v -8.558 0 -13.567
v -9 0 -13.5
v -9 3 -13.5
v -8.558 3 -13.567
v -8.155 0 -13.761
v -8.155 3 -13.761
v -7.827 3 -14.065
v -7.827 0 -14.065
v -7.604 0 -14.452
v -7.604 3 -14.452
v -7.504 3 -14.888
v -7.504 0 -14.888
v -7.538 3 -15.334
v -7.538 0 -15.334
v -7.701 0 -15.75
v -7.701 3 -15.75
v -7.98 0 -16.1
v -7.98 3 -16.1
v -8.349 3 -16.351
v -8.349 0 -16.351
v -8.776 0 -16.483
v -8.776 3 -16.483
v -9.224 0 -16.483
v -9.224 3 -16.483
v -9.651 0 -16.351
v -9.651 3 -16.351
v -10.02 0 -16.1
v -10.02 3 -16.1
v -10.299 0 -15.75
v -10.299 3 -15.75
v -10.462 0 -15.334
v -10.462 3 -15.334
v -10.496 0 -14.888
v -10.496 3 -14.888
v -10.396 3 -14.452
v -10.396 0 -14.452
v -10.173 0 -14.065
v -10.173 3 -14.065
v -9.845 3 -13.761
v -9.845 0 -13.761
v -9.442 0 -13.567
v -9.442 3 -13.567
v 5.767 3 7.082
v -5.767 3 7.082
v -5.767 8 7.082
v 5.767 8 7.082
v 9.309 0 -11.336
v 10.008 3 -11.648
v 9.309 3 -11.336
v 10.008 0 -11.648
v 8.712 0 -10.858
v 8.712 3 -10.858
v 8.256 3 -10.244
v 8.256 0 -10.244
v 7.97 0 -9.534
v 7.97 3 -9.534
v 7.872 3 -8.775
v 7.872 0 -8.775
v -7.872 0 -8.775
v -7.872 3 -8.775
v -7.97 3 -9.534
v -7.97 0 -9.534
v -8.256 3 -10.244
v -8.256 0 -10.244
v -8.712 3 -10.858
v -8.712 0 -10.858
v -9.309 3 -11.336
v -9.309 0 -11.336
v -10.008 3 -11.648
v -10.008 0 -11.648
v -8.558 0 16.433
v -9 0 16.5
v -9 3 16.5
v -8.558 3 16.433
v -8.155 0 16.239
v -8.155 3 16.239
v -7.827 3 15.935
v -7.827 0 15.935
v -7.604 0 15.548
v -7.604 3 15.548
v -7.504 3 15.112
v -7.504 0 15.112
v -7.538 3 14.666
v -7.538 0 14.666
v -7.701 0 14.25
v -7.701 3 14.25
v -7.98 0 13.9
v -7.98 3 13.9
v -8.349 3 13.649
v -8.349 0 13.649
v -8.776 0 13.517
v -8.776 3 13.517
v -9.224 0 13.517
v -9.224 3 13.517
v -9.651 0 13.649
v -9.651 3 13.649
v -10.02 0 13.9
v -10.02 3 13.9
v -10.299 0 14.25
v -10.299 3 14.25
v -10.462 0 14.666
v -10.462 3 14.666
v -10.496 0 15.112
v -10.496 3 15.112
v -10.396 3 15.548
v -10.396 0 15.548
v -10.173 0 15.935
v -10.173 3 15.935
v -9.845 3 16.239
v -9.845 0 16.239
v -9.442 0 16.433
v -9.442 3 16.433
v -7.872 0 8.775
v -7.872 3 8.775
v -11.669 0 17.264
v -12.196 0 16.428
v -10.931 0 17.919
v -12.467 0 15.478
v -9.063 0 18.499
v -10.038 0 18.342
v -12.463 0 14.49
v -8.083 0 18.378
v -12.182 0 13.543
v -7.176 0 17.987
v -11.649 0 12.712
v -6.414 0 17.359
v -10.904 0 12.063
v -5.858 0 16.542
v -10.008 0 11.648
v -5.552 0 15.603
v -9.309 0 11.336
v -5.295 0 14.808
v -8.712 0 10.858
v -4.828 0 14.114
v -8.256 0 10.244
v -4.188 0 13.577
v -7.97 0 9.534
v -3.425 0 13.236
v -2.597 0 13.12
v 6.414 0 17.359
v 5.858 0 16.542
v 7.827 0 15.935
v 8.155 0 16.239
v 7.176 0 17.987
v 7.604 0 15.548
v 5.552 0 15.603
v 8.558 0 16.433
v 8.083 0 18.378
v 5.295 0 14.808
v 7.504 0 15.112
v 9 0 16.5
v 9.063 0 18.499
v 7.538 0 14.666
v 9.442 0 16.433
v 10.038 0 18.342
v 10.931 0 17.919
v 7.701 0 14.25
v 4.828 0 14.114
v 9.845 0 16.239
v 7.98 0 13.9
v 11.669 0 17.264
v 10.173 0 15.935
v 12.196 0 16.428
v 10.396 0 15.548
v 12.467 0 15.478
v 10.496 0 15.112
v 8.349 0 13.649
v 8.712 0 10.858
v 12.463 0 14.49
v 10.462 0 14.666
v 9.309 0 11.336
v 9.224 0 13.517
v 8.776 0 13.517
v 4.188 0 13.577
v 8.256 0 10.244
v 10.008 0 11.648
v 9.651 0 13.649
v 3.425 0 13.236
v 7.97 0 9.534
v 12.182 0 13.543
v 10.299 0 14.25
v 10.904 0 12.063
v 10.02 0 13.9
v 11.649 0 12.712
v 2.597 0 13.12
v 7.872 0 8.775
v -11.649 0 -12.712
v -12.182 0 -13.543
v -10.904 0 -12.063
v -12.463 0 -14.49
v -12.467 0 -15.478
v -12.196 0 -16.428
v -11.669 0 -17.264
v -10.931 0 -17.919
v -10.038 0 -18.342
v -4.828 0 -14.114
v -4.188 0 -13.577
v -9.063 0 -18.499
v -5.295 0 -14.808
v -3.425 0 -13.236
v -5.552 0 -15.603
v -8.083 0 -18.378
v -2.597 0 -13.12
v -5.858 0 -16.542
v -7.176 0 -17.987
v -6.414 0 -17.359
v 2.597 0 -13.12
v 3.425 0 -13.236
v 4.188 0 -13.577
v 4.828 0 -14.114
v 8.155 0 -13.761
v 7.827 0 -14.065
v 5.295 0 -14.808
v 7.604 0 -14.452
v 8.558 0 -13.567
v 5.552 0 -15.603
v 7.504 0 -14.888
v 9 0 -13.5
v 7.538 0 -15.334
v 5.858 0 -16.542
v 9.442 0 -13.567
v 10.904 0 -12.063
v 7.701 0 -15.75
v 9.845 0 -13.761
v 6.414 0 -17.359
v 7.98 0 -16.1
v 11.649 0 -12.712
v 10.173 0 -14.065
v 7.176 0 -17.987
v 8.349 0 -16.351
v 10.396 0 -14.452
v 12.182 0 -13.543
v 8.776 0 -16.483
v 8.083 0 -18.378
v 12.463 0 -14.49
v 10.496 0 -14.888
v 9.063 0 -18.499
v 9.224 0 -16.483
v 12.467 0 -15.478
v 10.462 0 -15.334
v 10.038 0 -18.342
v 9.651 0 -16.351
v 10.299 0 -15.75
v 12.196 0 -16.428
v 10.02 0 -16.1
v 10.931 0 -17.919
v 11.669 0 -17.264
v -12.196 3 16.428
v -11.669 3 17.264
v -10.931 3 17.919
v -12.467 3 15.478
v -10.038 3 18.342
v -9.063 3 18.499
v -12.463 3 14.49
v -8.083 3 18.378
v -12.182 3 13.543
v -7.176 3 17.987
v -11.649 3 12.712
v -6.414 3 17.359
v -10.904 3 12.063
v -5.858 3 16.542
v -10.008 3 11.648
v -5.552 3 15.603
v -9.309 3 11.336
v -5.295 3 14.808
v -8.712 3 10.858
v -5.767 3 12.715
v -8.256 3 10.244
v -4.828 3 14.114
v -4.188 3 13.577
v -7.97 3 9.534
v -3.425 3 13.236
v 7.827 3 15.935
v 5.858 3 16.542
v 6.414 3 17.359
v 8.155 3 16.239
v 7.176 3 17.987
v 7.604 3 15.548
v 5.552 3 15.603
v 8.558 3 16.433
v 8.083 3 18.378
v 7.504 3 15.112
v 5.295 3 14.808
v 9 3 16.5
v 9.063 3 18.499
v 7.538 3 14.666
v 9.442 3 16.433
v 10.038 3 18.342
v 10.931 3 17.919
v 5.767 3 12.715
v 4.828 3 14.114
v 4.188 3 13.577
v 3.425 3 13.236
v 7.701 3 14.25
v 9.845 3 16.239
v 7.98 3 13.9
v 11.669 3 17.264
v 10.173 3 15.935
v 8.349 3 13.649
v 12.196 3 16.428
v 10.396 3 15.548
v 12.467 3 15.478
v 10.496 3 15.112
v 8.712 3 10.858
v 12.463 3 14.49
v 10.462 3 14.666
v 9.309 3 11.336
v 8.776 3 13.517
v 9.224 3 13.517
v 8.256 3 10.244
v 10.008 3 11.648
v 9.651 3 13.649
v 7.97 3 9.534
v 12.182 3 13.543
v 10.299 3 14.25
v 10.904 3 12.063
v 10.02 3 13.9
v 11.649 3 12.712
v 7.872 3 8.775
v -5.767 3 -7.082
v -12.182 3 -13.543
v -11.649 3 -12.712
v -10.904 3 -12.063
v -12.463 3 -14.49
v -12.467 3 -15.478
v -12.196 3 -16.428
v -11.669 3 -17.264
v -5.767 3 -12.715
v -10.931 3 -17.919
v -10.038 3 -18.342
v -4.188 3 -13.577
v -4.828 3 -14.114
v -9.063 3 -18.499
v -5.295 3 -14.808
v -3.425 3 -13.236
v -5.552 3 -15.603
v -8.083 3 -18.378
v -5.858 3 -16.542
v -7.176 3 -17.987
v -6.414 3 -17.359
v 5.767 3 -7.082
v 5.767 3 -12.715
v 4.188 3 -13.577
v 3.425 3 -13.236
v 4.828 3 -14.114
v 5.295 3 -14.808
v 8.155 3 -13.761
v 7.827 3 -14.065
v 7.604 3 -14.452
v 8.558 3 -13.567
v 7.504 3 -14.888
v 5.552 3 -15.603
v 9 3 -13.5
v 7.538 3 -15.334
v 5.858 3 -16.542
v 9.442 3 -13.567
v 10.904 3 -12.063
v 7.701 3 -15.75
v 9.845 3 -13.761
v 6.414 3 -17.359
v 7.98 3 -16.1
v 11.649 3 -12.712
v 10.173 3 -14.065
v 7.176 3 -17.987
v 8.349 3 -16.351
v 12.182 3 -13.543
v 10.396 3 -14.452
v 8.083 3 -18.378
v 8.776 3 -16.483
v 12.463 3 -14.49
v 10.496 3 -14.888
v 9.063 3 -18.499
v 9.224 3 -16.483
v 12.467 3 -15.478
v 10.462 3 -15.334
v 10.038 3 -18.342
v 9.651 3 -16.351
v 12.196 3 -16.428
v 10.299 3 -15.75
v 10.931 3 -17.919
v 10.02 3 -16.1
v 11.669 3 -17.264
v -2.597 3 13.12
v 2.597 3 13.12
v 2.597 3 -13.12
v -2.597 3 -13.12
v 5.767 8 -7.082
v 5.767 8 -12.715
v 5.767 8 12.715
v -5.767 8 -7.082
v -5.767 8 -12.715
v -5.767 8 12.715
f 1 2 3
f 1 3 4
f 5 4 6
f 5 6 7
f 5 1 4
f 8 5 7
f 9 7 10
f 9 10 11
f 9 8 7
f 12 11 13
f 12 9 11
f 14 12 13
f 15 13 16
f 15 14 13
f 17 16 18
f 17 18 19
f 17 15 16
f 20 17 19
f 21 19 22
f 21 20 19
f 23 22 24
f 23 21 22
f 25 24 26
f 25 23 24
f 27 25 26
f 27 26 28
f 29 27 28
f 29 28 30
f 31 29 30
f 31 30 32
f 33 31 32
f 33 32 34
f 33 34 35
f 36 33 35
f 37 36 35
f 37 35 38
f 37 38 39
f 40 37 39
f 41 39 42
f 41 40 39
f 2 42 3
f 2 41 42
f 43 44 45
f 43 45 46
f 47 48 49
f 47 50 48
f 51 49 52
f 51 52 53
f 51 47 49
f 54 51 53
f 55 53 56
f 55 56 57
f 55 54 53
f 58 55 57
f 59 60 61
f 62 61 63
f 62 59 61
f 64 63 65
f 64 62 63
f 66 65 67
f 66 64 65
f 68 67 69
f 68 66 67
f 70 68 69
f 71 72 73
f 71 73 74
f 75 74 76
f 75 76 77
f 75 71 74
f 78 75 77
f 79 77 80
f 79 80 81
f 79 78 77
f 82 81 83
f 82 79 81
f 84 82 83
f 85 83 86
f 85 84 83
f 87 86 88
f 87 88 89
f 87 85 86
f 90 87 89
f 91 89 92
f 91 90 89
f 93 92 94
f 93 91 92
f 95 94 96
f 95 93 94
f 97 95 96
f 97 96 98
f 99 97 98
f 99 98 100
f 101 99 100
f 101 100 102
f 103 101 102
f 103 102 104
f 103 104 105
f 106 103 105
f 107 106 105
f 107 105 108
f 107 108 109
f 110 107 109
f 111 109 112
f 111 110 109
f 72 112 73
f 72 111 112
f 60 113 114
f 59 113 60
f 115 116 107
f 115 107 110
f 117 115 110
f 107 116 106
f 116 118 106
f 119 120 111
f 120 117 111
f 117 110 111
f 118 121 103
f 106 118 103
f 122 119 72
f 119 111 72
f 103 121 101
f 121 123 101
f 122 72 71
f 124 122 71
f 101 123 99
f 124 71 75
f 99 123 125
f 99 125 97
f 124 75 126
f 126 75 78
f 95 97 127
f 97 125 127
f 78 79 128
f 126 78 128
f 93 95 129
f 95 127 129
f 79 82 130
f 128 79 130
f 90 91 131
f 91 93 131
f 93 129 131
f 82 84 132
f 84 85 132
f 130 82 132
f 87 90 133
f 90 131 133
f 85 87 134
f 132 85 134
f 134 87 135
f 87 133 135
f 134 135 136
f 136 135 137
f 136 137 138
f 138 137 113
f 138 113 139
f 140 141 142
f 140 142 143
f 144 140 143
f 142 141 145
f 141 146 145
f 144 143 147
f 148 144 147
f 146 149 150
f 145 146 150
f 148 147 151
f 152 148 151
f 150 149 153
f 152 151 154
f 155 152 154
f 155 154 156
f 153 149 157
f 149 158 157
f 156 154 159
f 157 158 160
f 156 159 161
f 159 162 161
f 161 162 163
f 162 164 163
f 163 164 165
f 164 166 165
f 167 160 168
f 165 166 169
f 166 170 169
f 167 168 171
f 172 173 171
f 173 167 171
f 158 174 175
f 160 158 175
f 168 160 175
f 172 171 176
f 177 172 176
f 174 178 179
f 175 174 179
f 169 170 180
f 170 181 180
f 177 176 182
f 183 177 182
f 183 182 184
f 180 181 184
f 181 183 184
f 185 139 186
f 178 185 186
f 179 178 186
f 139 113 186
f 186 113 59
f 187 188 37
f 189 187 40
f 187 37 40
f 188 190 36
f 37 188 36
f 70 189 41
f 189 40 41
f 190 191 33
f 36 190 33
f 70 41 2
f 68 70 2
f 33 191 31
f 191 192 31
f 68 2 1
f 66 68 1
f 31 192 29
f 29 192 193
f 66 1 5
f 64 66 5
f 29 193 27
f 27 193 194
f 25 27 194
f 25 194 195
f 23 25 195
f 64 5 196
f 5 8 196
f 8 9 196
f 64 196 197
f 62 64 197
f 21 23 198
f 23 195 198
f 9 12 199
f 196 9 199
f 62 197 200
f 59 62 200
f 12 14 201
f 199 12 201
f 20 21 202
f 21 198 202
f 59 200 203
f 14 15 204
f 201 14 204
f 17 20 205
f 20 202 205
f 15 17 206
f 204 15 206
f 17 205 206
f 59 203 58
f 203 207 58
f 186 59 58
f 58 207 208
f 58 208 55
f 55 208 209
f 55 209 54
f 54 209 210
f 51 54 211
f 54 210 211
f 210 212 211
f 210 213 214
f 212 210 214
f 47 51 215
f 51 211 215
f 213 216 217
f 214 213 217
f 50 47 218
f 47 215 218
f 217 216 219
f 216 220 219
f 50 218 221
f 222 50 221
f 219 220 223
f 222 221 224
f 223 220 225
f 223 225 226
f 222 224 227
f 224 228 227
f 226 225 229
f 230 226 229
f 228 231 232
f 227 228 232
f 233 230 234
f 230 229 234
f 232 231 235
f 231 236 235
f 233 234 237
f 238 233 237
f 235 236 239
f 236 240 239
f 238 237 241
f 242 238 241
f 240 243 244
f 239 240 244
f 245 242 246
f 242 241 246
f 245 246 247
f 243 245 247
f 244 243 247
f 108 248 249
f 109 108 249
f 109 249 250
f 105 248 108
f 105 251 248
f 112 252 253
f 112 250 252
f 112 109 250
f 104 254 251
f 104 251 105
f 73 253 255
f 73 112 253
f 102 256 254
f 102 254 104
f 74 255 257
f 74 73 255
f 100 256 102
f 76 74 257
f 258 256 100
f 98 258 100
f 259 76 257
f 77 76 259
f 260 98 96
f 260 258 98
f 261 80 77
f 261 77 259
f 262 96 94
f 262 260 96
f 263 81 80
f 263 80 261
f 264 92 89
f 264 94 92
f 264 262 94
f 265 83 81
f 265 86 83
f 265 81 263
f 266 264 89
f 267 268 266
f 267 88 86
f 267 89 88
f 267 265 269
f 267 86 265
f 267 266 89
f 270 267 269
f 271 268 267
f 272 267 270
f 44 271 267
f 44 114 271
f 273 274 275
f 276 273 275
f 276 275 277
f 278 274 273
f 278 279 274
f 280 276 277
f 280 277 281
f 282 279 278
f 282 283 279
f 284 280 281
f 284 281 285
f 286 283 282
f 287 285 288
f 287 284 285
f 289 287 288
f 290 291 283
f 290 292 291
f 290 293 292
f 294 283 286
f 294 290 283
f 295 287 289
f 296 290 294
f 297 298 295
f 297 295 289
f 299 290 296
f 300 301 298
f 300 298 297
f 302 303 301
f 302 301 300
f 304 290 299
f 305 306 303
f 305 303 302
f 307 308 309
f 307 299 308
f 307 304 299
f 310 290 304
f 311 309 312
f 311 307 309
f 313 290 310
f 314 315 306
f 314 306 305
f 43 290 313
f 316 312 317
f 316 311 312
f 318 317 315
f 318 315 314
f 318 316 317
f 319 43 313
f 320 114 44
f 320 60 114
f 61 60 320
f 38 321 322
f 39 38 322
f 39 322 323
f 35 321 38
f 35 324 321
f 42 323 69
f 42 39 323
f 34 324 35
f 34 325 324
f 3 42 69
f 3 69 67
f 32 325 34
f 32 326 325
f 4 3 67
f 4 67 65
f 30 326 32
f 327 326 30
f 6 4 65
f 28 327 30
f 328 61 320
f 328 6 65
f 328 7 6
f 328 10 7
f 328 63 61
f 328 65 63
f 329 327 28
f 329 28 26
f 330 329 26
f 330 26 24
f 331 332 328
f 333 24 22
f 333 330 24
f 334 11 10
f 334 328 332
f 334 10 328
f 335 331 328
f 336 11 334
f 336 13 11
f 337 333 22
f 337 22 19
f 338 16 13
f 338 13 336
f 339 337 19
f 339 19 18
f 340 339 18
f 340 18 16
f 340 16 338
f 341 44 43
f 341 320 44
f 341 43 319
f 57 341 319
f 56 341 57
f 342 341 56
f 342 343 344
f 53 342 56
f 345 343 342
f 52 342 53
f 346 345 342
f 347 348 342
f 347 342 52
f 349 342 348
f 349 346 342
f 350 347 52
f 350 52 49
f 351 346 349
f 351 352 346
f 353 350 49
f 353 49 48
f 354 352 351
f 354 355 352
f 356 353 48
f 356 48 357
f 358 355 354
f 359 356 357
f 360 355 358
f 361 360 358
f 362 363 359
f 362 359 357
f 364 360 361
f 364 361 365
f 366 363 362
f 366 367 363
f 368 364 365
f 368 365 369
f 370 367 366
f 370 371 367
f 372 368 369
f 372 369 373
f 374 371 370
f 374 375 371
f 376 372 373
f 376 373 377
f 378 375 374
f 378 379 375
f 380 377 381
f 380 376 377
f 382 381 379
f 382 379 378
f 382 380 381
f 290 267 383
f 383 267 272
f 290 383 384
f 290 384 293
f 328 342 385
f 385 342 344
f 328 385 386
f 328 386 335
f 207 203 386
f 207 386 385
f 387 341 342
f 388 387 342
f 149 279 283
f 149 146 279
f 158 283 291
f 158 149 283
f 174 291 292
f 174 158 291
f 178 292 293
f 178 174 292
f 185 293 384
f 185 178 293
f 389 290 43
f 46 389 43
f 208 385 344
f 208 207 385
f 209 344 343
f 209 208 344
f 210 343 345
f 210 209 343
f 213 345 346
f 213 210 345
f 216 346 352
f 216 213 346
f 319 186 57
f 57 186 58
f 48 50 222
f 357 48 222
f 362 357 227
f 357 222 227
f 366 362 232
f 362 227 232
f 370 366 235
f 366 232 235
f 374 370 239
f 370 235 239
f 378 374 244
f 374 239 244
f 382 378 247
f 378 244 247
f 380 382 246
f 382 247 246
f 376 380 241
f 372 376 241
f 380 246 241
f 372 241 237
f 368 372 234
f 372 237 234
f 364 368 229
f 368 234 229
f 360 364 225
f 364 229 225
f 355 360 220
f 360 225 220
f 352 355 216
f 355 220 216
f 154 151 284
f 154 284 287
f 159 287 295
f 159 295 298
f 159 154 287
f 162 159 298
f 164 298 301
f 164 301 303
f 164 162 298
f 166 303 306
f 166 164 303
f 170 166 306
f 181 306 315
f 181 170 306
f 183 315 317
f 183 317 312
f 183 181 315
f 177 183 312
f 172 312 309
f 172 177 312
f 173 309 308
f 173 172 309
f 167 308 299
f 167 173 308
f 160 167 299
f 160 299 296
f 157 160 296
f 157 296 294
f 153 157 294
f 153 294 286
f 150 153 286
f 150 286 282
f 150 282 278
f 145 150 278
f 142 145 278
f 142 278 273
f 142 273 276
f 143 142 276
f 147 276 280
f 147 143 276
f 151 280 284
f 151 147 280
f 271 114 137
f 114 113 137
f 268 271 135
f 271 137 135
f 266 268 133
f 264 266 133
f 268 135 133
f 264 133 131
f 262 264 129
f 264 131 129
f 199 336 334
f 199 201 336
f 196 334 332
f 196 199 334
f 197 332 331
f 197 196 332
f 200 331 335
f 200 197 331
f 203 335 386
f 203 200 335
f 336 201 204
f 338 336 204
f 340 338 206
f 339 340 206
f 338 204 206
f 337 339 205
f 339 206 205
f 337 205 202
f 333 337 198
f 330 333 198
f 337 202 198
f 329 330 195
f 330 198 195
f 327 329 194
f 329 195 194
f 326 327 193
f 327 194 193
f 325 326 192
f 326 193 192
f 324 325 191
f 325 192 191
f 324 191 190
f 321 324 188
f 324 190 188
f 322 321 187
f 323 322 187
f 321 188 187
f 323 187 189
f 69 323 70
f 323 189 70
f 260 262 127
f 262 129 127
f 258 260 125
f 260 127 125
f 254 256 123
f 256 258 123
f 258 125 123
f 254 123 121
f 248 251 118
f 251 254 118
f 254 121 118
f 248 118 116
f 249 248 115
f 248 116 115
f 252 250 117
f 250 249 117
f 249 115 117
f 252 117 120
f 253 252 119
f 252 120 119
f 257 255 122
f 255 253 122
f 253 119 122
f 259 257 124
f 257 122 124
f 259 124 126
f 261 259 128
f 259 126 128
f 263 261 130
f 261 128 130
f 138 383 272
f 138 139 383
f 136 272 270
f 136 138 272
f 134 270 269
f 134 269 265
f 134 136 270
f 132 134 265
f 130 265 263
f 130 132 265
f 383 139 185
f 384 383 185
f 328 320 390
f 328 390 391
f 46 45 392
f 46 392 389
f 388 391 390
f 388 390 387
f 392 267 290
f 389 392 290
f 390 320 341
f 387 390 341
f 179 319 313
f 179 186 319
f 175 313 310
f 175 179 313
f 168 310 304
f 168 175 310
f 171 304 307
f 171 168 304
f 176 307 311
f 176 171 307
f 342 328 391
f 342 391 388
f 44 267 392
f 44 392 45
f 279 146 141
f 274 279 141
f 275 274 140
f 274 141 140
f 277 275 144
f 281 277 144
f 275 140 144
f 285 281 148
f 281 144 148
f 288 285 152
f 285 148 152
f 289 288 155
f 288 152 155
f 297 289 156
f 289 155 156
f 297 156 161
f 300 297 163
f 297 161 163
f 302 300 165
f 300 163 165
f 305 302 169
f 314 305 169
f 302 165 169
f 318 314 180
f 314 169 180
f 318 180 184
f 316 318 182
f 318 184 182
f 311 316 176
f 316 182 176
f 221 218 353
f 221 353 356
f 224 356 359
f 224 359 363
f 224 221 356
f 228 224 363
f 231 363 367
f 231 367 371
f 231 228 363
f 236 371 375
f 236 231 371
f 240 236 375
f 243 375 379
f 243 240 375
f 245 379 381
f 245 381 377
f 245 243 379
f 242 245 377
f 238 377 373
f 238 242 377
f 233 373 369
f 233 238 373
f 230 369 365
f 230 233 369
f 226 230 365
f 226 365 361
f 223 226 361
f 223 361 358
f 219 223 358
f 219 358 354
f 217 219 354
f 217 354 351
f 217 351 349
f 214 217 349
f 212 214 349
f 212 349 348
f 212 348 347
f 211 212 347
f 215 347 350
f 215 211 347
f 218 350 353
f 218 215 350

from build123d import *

# Parameters (mm, degrees)
SKETCH1_R           = 3.5
SKETCH1_R_2         = 1.5
SKETCH1_W           = 15.74389133
SKETCH1_H           = 26.239818884
BOSS_EXTRUDE1_DEPTH = 3
FILLET1_R           = 3
SKETCH2_W           = 11.534893024
SKETCH2_H           = 5.633319849
BOSS_EXTRUDE2_DEPTH = 5


with BuildPart() as part:
    # Sketch1 → Boss-Extrude1 (new body)
    # profile 1 of 5: a face of its own
    with BuildSketch(Plane(origin=(0, 0, 0), x_dir=(1, 0, 0), z_dir=(0, 1, 0))):
        with Locations((9, 15)):
            Circle(SKETCH1_R)
        with Locations(Location((9, 15, 0), (0, 0, 270))):
            Circle(SKETCH1_R_2, mode=Mode.SUBTRACT)
    # profile 2 of 5: a face of its own
    with BuildSketch(Plane(origin=(0, 0, 0), x_dir=(1, 0, 0), z_dir=(0, 1, 0))):
        with Locations((9, -15)):
            Circle(SKETCH1_R)
        with Locations(Location((9, -15, 0), (0, 0, 270))):
            Circle(SKETCH1_R_2, mode=Mode.SUBTRACT)
    # profile 3 of 5: a face of its own
    with BuildSketch(Plane(origin=(0, 0, 0), x_dir=(1, 0, 0), z_dir=(0, 1, 0))):
        with Locations((-9, -15)):
            Circle(SKETCH1_R)
        with Locations(Location((-9, -15, 0), (0, 0, 270))):
            Circle(SKETCH1_R_2, mode=Mode.SUBTRACT)
    # profile 4 of 5: a face of its own
    with BuildSketch(Plane(origin=(0, 0, 0), x_dir=(1, 0, 0), z_dir=(0, 1, 0))):
        with Locations((-9, 15)):
            Circle(SKETCH1_R)
        with Locations(Location((-9, 15, 0), (0, 0, 270))):
            Circle(SKETCH1_R_2, mode=Mode.SUBTRACT)
    # profile 5 of 5: a face of its own
    with BuildSketch(Plane(origin=(0, 0, 0), x_dir=(1, 0, 0), z_dir=(0, 1, 0))):
        Rectangle(SKETCH1_W, SKETCH1_H)
    extrude(amount=BOSS_EXTRUDE1_DEPTH)

    # Fillet1
    fillet1_edges = [part.edges().sort_by_distance(p)[0] for p in [
        (-6.047838166, 1.5, -13.119909442),
        (6.047838166, 1.5, -13.119909442),
        (7.871945665, 1.5, -11.686769942),
        (7.871945665, 1.5, 11.686769942),
        (6.047838166, 1.5, 13.119909442),
        (-6.047838166, 1.5, 13.119909442),
        (-7.871945665, 1.5, 11.686769942),
        (-7.871945665, 1.5, -11.686769942),
    ]]
    fillet(fillet1_edges, radius=FILLET1_R)

    # Sketch2 → Boss-Extrude2 (add)
    with BuildSketch(Plane(origin=(0, 3, 0), x_dir=(1, 0, 0), z_dir=(0, 1, 0))):
        with Locations((0, 9.898547735)):
            Rectangle(SKETCH2_W, SKETCH2_H)
        with Locations((0, -9.898547735)):
            Rectangle(SKETCH2_W, SKETCH2_H)
    extrude(amount=BOSS_EXTRUDE2_DEPTH)


solid = part.part
